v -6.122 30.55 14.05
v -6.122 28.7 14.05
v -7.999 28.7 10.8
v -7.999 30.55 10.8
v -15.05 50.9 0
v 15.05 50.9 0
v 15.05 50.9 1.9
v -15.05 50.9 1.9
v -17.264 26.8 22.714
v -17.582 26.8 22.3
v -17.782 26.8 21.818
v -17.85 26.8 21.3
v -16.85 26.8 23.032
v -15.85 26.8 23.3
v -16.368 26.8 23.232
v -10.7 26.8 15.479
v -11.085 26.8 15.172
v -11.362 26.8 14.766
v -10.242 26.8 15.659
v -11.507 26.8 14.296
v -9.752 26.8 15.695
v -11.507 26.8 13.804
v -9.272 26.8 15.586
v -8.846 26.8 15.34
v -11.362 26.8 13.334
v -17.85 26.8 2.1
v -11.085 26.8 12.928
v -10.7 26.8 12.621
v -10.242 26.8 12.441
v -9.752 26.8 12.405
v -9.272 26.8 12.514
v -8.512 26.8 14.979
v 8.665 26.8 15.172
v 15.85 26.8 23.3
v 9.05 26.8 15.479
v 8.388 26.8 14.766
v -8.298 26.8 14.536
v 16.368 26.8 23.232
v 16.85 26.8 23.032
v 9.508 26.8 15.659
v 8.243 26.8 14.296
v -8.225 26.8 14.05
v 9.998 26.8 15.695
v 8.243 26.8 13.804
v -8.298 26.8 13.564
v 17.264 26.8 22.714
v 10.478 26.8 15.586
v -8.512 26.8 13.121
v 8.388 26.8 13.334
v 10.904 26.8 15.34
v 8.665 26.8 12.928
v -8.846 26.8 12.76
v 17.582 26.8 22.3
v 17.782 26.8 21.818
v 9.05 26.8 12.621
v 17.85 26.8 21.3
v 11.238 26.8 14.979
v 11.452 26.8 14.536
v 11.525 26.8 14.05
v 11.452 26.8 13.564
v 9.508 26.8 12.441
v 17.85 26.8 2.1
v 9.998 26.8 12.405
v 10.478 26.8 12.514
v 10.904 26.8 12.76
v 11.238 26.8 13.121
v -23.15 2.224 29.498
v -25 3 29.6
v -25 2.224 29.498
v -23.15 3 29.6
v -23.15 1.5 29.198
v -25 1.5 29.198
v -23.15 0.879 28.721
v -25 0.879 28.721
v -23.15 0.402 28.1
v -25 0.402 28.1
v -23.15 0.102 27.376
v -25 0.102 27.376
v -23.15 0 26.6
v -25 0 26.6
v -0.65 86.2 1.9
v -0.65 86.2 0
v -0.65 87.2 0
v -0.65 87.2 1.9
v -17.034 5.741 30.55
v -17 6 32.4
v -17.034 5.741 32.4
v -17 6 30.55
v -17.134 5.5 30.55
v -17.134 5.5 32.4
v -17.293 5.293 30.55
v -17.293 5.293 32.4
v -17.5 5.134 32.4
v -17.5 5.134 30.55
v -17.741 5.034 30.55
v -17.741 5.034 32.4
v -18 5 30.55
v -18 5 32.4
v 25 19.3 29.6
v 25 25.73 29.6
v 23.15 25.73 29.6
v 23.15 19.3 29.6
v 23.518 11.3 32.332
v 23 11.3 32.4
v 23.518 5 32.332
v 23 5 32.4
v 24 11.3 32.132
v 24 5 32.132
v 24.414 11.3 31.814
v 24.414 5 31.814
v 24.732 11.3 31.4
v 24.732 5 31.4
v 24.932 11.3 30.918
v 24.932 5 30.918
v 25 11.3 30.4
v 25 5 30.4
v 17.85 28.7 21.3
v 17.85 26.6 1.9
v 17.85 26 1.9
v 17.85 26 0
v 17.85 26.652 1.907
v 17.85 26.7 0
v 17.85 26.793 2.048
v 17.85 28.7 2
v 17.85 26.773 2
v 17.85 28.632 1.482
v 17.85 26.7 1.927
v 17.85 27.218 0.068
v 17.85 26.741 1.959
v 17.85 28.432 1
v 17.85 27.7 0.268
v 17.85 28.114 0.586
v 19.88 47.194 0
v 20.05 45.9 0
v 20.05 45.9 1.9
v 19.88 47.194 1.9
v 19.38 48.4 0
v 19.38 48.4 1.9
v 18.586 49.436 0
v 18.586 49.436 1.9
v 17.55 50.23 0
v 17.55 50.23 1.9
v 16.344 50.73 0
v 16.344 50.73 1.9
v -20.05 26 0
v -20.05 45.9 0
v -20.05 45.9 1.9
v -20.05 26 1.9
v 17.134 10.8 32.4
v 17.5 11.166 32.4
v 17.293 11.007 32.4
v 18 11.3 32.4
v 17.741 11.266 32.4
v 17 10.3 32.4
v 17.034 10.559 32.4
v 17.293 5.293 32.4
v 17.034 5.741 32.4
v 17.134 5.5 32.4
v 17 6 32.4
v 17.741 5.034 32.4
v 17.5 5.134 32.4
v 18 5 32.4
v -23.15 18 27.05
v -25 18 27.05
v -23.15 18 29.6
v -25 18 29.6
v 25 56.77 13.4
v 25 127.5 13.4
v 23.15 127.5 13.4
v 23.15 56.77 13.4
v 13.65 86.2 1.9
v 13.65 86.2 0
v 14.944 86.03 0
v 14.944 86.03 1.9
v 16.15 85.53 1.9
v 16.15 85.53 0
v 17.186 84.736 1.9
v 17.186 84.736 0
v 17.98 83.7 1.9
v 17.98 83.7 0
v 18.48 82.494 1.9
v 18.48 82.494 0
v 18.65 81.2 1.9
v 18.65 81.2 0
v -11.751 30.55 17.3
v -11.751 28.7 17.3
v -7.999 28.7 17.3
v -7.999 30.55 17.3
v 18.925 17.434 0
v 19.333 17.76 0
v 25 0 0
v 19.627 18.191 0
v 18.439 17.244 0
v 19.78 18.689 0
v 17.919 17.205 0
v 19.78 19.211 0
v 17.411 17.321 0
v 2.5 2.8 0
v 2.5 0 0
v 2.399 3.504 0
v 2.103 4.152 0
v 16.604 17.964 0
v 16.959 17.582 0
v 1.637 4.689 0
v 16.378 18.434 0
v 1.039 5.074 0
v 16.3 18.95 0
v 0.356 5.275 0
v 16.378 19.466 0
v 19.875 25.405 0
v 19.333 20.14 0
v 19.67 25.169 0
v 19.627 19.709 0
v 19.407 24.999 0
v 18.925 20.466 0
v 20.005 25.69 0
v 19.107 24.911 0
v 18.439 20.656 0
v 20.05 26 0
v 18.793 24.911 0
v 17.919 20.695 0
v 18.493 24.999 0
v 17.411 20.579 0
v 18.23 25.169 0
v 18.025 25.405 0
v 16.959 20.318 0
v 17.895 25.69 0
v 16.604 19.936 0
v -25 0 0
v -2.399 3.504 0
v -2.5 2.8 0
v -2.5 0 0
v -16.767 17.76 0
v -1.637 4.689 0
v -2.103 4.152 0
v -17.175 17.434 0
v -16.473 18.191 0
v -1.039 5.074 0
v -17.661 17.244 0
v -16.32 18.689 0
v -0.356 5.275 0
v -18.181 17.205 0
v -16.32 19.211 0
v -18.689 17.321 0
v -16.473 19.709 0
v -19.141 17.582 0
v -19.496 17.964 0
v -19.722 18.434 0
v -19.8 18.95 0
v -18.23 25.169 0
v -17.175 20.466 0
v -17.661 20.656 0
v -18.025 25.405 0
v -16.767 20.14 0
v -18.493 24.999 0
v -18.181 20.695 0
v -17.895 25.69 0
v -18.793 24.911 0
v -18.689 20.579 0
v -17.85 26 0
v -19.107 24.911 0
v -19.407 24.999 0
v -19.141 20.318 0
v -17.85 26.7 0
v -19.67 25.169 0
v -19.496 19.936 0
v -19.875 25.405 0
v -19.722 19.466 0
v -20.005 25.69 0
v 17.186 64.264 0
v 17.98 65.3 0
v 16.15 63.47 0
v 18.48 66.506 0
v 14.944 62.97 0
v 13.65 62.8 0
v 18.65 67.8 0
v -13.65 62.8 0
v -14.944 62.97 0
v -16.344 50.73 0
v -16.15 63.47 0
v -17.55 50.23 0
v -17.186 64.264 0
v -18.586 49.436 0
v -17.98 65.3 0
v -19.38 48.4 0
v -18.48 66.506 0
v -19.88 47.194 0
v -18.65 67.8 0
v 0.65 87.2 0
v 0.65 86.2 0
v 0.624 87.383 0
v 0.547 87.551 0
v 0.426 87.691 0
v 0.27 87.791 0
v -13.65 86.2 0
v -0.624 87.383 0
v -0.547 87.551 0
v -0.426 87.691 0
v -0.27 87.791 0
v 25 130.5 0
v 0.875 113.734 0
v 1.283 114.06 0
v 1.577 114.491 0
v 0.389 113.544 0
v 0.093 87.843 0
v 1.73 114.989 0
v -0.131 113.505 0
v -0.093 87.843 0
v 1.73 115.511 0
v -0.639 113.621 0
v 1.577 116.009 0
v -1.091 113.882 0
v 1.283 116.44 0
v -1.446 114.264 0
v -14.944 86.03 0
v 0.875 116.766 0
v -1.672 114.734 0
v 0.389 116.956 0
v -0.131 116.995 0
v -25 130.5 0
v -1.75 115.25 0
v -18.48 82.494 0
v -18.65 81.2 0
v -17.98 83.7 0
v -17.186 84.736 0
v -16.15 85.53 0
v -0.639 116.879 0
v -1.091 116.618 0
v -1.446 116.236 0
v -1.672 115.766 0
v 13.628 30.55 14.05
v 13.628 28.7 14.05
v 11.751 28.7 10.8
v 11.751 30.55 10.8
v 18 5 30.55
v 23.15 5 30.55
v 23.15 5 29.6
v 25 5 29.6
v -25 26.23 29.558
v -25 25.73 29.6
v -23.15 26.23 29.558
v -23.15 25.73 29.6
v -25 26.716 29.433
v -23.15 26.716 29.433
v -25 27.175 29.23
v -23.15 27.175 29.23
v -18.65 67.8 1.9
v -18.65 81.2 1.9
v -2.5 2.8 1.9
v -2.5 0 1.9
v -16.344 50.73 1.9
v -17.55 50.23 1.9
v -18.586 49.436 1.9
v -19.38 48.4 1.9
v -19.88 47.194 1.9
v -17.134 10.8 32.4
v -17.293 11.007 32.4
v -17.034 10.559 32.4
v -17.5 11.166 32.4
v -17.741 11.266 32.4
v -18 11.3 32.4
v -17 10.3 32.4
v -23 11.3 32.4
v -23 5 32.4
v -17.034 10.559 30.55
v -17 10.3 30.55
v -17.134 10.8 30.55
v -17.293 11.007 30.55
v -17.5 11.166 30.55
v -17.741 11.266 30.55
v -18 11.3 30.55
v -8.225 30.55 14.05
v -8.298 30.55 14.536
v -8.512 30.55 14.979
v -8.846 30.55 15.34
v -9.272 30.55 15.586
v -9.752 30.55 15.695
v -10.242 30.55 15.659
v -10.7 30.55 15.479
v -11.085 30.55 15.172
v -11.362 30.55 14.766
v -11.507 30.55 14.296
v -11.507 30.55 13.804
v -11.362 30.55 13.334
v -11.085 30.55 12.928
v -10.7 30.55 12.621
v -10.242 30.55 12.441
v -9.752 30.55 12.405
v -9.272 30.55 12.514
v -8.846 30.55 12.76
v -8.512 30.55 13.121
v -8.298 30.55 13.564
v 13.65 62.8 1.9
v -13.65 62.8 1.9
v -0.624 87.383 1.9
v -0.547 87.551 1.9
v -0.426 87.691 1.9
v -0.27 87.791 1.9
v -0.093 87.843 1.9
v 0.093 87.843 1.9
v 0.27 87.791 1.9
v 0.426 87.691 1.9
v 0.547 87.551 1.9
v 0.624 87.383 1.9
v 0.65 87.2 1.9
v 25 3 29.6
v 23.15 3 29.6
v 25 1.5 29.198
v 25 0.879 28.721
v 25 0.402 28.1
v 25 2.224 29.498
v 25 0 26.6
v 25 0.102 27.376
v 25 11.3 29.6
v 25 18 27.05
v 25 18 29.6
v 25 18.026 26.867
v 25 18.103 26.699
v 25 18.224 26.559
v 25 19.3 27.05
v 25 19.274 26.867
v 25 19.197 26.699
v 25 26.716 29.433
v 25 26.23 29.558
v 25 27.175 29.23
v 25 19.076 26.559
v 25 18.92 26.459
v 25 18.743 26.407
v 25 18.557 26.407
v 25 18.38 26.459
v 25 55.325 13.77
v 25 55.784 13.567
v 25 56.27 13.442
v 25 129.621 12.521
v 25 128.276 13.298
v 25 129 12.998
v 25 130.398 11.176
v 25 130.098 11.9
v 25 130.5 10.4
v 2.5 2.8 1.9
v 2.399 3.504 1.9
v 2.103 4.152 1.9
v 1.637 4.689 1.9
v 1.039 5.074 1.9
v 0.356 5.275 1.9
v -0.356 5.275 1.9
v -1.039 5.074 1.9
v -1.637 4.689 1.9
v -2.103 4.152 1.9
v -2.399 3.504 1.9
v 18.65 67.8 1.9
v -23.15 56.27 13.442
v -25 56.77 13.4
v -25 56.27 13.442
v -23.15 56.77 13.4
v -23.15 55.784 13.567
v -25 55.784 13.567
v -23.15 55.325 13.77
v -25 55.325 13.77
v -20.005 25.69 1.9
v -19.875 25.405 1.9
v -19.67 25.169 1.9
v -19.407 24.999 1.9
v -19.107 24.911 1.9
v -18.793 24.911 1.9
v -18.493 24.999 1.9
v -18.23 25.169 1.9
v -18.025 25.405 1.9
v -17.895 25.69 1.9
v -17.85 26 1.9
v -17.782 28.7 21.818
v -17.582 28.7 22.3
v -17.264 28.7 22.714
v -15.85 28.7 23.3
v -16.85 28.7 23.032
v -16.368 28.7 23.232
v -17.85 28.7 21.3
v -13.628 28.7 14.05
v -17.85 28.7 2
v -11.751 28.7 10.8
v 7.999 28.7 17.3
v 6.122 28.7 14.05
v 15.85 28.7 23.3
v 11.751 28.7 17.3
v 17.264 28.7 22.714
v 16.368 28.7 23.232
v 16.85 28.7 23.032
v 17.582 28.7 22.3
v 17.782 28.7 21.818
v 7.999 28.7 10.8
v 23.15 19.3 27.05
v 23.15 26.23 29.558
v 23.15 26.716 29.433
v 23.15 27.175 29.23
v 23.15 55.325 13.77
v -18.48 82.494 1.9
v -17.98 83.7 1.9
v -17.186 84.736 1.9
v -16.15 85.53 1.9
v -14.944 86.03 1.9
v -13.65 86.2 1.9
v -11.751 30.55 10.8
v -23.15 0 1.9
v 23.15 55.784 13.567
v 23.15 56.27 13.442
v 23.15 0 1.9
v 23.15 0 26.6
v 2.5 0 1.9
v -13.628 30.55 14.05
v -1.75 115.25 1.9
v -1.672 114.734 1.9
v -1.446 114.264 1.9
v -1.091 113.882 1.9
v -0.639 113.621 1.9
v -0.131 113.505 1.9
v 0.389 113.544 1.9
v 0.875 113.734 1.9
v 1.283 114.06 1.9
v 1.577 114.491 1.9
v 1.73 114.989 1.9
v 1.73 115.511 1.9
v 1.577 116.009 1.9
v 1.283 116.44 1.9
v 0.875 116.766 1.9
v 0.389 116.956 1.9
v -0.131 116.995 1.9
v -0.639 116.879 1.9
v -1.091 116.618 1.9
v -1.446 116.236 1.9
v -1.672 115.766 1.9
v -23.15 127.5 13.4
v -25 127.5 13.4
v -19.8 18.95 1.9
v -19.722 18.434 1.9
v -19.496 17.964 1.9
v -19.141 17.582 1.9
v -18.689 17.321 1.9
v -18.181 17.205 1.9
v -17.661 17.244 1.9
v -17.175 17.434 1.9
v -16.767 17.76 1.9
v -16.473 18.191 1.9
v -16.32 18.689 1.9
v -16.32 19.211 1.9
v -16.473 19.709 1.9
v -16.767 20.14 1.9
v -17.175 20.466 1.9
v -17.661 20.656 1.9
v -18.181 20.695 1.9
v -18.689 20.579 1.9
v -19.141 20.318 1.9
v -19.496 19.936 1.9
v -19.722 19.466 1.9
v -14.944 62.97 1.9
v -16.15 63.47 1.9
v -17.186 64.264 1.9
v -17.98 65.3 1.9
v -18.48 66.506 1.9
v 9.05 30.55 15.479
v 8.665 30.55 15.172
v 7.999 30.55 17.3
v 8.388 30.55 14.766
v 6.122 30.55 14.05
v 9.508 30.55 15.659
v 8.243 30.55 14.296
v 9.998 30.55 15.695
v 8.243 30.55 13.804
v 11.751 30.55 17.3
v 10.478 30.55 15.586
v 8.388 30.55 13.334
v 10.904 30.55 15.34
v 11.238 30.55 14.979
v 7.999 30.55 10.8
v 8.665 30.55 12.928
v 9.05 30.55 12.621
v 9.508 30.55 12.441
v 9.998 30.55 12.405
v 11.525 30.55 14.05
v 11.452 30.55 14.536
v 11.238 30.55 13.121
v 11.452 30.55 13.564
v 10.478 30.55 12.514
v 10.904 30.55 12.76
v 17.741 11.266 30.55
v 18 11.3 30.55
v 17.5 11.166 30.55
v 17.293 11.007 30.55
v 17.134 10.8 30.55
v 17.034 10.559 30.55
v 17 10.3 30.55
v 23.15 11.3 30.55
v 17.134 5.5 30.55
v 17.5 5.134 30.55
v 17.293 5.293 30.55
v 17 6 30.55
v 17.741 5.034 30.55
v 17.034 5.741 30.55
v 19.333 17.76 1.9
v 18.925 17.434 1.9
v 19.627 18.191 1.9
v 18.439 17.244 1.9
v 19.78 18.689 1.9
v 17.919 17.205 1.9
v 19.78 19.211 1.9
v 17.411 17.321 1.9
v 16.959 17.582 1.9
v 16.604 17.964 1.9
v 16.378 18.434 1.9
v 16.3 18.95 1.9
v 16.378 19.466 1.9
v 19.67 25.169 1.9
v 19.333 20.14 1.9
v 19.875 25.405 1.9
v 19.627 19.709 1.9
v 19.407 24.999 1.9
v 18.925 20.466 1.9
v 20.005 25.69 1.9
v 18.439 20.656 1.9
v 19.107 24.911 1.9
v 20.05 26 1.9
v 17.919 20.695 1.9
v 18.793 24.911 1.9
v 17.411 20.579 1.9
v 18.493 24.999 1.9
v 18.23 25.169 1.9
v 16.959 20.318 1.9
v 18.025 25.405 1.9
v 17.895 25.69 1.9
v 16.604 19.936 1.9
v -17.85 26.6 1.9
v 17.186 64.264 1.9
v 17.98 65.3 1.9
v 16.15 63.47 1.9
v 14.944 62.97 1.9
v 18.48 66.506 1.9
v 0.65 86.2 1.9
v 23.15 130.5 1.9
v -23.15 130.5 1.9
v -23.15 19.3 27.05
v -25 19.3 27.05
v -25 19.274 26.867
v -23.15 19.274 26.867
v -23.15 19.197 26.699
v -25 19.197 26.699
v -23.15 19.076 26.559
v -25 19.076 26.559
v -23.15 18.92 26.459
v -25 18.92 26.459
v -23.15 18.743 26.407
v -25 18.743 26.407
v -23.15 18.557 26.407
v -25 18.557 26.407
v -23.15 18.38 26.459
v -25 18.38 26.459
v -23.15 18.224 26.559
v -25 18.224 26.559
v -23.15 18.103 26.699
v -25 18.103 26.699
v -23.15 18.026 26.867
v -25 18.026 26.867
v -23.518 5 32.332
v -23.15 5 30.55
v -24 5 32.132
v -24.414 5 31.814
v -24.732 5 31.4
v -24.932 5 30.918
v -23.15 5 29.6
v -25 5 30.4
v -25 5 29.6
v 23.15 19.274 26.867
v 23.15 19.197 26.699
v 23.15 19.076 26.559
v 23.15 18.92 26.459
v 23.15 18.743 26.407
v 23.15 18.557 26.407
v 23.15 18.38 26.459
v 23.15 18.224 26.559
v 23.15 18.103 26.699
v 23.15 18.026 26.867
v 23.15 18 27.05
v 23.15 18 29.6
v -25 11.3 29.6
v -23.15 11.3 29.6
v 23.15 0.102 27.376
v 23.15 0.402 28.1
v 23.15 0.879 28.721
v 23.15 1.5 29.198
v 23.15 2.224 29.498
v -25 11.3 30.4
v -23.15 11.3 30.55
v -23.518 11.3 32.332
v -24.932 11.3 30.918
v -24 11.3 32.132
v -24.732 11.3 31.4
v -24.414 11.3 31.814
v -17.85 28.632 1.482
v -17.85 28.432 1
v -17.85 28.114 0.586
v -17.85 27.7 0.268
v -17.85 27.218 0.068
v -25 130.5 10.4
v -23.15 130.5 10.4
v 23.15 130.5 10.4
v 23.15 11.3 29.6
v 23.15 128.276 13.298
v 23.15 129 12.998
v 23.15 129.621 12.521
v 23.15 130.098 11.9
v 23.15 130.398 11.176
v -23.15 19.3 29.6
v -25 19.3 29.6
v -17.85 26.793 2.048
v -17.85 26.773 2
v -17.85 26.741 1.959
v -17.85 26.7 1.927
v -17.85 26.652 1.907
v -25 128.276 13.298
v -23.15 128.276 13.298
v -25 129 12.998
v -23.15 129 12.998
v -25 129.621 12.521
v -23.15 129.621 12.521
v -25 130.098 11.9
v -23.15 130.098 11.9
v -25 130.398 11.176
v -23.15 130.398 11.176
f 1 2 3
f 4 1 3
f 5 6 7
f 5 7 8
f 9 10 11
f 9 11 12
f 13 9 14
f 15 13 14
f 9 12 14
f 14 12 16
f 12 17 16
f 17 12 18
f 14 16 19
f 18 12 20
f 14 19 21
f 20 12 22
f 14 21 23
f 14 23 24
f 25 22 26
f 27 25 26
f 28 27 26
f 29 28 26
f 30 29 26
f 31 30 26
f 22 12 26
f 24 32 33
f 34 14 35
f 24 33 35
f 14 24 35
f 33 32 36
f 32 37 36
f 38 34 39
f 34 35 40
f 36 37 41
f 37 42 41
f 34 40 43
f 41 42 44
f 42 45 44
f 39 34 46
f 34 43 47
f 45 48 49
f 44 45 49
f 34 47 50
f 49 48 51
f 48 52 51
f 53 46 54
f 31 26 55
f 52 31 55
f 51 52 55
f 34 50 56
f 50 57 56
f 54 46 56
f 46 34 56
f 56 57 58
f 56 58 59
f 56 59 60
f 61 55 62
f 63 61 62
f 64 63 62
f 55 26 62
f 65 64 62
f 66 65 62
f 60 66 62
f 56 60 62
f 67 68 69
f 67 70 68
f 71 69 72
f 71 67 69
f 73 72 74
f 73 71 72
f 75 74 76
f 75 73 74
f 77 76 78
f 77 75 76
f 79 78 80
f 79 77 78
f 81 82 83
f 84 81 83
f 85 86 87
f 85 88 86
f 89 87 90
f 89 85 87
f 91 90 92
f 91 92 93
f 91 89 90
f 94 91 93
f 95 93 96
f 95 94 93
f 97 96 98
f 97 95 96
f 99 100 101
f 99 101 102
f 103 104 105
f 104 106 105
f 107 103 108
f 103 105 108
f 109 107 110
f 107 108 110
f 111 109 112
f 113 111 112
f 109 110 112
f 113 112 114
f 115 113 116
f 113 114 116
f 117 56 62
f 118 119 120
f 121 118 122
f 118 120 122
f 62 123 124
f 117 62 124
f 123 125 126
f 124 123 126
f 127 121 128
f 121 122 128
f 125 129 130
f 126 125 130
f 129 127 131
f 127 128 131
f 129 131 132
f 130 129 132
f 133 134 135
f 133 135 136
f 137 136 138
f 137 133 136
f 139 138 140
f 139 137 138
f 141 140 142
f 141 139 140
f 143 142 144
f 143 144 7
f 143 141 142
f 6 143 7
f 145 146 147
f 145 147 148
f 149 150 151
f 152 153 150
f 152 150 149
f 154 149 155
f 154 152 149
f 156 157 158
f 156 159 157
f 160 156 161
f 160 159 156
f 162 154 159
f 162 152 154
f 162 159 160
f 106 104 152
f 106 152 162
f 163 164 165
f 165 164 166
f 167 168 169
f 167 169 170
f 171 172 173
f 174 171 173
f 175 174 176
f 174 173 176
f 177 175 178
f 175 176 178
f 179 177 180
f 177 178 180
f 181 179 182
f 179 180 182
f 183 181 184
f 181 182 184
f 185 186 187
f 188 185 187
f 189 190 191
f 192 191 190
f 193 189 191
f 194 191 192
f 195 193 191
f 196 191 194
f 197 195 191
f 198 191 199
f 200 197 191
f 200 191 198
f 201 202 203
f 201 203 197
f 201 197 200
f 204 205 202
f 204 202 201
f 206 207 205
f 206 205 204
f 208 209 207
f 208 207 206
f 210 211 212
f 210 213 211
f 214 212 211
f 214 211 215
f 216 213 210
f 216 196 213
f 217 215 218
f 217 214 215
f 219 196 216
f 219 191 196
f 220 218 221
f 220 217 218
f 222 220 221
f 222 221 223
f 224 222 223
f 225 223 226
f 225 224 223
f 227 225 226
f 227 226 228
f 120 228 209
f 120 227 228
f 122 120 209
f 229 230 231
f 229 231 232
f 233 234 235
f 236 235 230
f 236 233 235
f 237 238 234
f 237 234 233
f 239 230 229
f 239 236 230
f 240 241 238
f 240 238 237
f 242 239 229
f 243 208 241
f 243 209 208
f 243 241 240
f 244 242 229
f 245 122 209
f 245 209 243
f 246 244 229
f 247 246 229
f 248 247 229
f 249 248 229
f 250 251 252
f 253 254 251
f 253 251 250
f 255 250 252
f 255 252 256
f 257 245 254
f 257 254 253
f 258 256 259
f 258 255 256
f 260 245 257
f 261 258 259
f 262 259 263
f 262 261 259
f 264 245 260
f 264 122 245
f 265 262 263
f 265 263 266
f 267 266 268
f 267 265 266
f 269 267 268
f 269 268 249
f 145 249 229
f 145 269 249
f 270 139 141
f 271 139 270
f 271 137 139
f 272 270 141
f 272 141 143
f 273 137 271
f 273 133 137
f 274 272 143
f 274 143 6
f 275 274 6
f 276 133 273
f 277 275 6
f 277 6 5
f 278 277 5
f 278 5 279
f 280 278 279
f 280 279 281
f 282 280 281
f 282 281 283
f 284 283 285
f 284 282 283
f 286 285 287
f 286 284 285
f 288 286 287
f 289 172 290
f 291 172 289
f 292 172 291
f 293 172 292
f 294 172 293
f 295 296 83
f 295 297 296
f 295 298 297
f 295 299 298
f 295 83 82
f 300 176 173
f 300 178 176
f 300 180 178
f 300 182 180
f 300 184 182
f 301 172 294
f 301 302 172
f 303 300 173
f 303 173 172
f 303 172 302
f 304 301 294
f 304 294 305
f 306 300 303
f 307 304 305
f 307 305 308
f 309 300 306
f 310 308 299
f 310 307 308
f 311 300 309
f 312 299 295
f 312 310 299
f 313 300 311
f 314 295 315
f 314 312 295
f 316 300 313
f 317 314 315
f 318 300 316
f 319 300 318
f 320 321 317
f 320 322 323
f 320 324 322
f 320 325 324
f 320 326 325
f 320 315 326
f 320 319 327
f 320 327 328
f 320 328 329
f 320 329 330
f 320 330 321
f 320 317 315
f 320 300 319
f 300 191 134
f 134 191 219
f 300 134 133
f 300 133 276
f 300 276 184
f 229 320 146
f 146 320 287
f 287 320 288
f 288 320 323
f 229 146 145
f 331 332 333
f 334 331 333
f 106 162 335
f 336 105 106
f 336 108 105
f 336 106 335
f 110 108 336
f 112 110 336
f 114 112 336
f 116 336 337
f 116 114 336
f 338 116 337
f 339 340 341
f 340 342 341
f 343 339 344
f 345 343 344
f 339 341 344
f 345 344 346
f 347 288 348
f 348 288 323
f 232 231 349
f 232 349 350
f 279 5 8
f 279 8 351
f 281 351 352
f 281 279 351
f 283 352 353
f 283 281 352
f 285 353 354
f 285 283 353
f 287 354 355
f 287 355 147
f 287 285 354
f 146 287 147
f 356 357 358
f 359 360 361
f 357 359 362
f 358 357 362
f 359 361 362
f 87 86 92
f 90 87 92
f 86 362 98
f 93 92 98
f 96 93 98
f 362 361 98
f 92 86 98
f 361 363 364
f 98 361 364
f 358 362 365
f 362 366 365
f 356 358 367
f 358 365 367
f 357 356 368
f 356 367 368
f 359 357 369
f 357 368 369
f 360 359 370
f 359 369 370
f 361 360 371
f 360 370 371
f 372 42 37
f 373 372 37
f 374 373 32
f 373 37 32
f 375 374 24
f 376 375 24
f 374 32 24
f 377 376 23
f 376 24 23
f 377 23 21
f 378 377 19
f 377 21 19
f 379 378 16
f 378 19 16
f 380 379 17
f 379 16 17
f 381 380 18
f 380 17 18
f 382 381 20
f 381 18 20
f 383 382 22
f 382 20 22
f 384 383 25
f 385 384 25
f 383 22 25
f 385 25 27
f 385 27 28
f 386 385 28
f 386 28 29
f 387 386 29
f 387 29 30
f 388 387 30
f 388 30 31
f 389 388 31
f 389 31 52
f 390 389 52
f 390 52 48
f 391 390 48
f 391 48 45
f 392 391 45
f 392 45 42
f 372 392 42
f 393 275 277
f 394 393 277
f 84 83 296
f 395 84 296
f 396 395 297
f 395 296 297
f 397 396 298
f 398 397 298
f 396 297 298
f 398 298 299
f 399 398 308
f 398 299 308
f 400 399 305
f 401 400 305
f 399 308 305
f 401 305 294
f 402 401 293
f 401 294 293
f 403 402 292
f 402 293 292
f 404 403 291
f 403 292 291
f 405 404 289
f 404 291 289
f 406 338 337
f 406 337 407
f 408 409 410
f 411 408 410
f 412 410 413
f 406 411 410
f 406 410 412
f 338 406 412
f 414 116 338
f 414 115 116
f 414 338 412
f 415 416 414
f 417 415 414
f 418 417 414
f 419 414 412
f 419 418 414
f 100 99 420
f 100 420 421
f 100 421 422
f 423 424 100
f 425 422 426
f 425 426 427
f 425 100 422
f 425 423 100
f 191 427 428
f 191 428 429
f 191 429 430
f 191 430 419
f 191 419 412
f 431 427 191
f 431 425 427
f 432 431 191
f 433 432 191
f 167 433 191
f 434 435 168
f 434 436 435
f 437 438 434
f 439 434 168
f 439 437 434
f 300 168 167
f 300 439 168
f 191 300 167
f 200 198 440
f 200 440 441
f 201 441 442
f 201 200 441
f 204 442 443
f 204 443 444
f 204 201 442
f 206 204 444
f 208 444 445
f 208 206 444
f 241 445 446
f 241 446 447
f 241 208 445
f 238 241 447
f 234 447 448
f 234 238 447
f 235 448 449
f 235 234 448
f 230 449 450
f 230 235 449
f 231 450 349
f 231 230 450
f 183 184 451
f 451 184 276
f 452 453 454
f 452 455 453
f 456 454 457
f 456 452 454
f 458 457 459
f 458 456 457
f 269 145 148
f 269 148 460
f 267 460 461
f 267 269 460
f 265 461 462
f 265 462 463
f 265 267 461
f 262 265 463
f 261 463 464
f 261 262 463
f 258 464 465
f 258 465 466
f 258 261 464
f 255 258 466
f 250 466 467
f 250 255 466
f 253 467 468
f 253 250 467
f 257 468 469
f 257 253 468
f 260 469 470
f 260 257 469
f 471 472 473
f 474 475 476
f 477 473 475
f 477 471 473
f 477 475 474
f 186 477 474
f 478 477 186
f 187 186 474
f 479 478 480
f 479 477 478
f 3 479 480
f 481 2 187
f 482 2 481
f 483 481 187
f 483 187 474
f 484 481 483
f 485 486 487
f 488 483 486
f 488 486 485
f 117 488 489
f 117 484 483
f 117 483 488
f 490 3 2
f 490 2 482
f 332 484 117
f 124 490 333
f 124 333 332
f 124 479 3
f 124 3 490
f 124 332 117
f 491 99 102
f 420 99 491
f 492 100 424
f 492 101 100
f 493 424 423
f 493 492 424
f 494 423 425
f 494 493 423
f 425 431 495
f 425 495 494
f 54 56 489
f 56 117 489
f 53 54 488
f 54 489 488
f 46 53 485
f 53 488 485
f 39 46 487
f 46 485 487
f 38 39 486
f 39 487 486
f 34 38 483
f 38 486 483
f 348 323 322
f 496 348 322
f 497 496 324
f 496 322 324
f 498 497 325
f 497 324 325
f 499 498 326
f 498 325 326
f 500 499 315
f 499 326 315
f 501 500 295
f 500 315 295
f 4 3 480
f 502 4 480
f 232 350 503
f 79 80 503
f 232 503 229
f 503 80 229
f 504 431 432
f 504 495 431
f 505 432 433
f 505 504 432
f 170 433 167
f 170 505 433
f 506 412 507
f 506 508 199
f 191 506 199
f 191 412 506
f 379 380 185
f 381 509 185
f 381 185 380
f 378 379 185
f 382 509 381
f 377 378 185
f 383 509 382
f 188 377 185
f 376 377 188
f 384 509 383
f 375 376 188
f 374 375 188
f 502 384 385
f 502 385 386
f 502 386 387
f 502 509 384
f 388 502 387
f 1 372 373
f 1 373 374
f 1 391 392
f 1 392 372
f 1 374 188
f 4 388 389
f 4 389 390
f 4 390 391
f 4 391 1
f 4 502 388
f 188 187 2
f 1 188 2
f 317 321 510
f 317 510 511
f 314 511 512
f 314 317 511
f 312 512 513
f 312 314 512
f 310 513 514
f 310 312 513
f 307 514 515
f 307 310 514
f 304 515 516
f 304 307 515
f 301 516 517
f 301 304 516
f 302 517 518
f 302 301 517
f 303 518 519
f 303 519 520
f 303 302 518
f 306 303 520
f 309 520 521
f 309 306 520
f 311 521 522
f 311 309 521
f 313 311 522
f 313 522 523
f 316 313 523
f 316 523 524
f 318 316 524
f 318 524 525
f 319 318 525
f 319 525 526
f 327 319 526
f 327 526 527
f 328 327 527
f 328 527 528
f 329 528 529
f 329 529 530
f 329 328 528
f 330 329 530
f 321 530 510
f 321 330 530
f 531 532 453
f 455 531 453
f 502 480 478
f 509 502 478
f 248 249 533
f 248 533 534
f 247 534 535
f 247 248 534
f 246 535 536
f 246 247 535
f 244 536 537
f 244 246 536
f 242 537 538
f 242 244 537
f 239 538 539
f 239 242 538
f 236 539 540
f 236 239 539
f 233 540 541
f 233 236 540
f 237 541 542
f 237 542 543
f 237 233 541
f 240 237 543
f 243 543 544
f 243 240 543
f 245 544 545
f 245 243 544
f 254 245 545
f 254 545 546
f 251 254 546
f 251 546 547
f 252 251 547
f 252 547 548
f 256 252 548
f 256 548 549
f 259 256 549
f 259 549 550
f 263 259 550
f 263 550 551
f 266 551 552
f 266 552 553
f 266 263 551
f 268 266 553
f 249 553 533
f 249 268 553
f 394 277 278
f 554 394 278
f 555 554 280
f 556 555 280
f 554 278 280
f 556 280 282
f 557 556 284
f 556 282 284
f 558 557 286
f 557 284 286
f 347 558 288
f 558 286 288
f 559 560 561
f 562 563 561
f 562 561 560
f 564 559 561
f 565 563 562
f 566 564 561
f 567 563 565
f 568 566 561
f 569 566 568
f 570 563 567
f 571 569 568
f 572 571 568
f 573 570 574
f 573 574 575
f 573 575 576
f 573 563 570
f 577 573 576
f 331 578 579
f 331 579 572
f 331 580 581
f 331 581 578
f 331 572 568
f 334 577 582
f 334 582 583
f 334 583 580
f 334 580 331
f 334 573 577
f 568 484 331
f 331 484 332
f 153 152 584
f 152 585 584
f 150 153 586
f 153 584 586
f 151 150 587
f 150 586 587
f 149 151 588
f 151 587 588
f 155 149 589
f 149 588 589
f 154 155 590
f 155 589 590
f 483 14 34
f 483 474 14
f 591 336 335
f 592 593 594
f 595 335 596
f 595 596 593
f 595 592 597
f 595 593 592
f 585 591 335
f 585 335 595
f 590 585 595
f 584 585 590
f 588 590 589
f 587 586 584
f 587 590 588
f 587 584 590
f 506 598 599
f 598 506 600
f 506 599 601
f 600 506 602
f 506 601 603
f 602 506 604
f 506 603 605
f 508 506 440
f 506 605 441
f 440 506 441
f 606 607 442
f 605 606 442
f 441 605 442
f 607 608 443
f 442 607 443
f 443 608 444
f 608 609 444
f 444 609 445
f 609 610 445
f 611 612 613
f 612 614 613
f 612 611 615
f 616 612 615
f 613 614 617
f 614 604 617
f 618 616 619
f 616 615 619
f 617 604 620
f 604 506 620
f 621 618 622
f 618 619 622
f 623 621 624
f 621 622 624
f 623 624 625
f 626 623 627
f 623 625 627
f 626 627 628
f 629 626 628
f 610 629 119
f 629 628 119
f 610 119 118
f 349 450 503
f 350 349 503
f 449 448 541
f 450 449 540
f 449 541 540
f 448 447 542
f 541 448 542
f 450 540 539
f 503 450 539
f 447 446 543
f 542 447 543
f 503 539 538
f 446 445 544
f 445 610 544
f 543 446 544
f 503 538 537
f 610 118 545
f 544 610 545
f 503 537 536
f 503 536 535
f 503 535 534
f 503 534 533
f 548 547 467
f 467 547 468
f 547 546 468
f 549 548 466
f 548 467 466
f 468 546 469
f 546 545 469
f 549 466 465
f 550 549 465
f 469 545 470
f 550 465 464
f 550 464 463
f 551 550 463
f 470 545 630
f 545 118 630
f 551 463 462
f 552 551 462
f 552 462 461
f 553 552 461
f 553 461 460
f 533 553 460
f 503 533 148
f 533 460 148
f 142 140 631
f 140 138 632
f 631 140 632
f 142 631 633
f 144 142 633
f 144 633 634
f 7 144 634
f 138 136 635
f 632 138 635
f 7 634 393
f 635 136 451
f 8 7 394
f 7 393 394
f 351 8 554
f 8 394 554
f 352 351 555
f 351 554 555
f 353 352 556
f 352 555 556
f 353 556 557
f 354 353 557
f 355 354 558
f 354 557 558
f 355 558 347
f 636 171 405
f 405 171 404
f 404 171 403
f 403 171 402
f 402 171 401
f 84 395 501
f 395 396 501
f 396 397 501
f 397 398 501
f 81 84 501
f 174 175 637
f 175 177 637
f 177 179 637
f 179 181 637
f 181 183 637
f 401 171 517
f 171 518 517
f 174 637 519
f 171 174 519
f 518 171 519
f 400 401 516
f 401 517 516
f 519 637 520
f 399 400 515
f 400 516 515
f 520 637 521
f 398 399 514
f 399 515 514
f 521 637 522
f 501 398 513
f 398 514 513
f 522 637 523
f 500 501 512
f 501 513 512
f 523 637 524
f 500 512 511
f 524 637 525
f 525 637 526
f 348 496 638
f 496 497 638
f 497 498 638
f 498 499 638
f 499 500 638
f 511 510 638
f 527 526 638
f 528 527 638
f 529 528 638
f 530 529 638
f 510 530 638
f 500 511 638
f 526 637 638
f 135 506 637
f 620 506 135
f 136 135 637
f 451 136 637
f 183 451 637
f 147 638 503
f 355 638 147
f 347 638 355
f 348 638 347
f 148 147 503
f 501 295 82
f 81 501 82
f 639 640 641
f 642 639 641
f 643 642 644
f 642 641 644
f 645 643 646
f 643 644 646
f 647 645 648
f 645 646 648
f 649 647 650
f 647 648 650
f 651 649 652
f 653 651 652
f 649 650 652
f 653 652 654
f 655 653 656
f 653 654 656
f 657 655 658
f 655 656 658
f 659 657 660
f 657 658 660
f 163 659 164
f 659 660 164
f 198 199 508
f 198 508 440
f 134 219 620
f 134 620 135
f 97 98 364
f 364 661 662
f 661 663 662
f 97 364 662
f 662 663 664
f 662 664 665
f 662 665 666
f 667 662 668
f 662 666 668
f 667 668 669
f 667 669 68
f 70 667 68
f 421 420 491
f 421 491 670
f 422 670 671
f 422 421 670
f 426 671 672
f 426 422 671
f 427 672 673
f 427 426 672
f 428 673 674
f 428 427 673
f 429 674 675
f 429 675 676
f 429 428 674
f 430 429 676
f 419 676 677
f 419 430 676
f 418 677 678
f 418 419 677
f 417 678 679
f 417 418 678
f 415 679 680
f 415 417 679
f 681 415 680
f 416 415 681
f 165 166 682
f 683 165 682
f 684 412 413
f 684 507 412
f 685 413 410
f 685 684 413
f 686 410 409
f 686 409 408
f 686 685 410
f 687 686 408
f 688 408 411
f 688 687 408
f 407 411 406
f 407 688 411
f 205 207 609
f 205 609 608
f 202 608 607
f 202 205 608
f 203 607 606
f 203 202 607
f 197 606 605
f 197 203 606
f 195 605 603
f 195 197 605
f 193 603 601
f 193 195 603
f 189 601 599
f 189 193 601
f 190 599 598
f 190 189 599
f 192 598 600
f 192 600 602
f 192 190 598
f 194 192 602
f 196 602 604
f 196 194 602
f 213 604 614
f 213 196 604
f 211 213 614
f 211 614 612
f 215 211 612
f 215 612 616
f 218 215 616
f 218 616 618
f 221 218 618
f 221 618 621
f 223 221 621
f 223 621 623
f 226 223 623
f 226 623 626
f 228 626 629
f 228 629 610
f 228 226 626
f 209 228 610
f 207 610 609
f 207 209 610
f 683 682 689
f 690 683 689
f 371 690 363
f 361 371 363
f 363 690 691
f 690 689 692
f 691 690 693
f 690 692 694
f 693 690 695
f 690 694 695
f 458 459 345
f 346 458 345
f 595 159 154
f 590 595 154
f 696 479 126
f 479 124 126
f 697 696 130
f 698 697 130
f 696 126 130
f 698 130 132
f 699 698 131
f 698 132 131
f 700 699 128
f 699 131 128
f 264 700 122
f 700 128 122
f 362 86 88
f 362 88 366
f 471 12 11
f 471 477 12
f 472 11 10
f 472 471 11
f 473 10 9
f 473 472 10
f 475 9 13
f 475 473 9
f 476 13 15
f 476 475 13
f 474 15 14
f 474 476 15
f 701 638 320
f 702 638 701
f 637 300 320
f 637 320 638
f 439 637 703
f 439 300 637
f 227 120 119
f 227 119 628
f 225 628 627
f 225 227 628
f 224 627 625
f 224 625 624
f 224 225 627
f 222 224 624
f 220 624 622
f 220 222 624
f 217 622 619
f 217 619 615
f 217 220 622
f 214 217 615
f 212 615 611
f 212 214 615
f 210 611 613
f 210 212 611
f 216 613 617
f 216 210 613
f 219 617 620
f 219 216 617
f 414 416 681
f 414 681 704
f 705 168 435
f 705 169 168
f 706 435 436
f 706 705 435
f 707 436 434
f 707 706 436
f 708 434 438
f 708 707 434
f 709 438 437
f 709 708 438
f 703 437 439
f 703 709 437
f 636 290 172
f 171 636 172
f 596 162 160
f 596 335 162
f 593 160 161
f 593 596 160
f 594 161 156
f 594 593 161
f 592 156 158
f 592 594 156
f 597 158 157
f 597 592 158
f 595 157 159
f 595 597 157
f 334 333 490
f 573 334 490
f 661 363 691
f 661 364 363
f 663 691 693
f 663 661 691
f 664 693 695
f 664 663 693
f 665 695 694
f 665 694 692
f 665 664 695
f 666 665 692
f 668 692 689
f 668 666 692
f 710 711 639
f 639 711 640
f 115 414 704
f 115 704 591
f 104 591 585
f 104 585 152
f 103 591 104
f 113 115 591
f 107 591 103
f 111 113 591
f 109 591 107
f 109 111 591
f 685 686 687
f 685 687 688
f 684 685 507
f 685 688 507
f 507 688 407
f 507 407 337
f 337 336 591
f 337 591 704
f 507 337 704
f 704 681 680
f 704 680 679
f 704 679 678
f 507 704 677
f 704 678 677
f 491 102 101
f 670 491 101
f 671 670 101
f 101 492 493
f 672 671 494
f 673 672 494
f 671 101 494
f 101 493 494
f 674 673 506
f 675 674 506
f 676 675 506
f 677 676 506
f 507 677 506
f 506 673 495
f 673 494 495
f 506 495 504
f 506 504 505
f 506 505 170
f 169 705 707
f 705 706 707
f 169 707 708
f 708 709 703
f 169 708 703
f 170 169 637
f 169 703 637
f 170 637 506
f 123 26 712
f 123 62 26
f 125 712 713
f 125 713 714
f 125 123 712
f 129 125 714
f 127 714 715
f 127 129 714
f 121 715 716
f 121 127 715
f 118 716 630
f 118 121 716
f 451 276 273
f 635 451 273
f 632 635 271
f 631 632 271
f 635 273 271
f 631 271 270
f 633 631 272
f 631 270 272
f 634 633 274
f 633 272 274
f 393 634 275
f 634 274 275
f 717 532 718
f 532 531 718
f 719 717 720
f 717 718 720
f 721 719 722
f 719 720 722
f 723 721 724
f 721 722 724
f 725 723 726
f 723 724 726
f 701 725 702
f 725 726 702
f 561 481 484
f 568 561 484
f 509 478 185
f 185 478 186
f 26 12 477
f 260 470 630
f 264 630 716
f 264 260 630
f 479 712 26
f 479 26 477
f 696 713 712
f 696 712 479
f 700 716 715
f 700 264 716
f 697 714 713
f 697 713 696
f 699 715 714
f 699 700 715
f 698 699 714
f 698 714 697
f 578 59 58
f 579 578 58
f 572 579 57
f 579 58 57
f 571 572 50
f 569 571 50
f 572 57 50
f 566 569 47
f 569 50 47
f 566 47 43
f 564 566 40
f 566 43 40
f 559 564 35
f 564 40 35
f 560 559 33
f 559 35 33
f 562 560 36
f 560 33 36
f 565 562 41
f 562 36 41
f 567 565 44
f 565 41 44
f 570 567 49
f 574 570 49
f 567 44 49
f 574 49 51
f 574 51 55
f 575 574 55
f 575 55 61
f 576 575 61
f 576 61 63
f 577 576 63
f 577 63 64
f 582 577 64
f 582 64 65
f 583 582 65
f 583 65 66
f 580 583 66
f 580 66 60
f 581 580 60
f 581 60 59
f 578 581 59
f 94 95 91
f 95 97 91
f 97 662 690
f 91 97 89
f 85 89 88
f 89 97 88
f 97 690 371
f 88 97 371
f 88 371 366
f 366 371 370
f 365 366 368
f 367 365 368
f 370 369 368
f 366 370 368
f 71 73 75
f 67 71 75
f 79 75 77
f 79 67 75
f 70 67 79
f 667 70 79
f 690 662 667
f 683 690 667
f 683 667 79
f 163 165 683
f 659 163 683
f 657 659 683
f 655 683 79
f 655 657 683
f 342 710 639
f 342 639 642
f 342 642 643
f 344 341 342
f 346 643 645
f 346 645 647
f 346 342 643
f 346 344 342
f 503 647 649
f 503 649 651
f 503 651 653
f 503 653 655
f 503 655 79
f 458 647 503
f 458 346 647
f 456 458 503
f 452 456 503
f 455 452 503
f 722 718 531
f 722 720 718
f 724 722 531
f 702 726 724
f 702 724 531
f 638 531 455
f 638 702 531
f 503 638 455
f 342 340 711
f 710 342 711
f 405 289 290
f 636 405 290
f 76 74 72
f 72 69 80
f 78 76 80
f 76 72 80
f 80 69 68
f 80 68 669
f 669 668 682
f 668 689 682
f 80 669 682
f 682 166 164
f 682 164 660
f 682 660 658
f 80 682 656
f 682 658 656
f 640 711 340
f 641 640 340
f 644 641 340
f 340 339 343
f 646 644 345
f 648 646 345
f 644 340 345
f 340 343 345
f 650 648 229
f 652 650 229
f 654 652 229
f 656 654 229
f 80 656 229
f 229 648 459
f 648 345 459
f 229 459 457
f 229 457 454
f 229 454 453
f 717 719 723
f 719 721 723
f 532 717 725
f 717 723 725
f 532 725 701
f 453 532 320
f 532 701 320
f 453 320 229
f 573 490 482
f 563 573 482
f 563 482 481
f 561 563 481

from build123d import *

# Parameters (mm, degrees)
ESQUISSE1_R           = 1.75
BOSS_EXTRU_1_DEPTH    = 1.9
ESQUISSE2_W           = 35.7
ESQUISSE2_H           = 1.9
BOSS_EXTRU_2_DEPTH    = 21.4
CONG_1_R              = 2
CONG_2_R              = 0.2
CONG_3_R              = 2
BOSS_EXTRU_3_DEPTH    = 1.85
TROU_TARAUD_M41_D     = 3.3
BOSS_EXTRU_4_DEPTH    = 1.85
CONG_4_R              = 3
ESQUISSE7_W           = 8
ESQUISSE7_H           = 6.3
BOSS_EXTRU_5_DEPTH    = 1.85
CONG_5_R              = 1
CONG_6_R              = 2
CONG_4_OF_SYM_TRIE1_R = 3
CONG_5_OF_SYM_TRIE1_R = 1
CONG_6_OF_SYM_TRIE1_R = 2


with BuildPart() as part:
    # Esquisse1 → Boss.-Extru.1 (new body)
    with BuildSketch(Plane.XY):
        with BuildLine():
            Line((25, 0), (2.5, 0))
            Line((2.5, 0), (2.5, 2.8))
            ThreePointArc((2.5, 2.8), (0, 5.3), (-2.5, 2.8))
            Line((-2.5, 2.8), (-2.5, 0))
            Line((-2.5, 0), (-25, 0))
            Line((-25, 0), (-25, 130.5))
            Line((-25, 130.5), (25, 130.5))
            Line((25, 130.5), (25, 0))
        make_face()
        with Locations(Location((-18.05, 18.95, 0), (0, 0, 180))):
            Circle(ESQUISSE1_R, mode=Mode.SUBTRACT)
        with Locations(Location((18.05, 18.95, 0), (0, 0, 180))):
            Circle(ESQUISSE1_R, mode=Mode.SUBTRACT)
        with Locations(Location((0, 115.25, 0), (0, 0, 180))):
            Circle(ESQUISSE1_R, mode=Mode.SUBTRACT)
        with BuildLine():
            Line((-17.85, 26), (-17.85, 28.7))
            Line((-17.85, 28.7), (17.85, 28.7))
            Line((17.85, 28.7), (17.85, 26))
            ThreePointArc((17.85, 26), (18.95, 24.9), (20.05, 26))
            Line((20.05, 26), (20.05, 45.9))
            ThreePointArc((20.05, 45.9), (18.585533906, 49.435533906), (15.05, 50.9))
            Line((15.05, 50.9), (-15.05, 50.9))
            ThreePointArc((-15.05, 50.9), (-18.585533906, 49.435533906), (-20.05, 45.9))
            Line((-20.05, 45.9), (-20.05, 26))
            ThreePointArc((-20.05, 26), (-18.95, 24.9), (-17.85, 26))
        make_face(mode=Mode.SUBTRACT)
        with BuildLine():
            Line((-13.65, 86.2), (-0.65, 86.2))
            Line((-0.65, 86.2), (-0.65, 87.2))
            ThreePointArc((-0.65, 87.2), (0, 87.85), (0.65, 87.2))
            Line((0.65, 87.2), (0.65, 86.2))
            Line((0.65, 86.2), (13.65, 86.2))
            ThreePointArc((13.65, 86.2), (17.185533906, 84.735533906), (18.65, 81.2))
            Line((18.65, 81.2), (18.65, 67.8))
            ThreePointArc((18.65, 67.8), (17.185533906, 64.264466094), (13.65, 62.8))
            Line((13.65, 62.8), (-13.65, 62.8))
            ThreePointArc((-13.65, 62.8), (-17.185533906, 64.264466094), (-18.65, 67.8))
            Line((-18.65, 67.8), (-18.65, 81.2))
            ThreePointArc((-18.65, 81.2), (-17.185533906, 84.735533906), (-13.65, 86.2))
        make_face(mode=Mode.SUBTRACT)
    extrude(amount=BOSS_EXTRU_1_DEPTH)

    # Esquisse2 → Boss.-Extru.2 (add)
    with BuildSketch(Plane.XY.offset(1.9)):
        with Locations((0, 27.75)):
            Rectangle(ESQUISSE2_W, ESQUISSE2_H)
    extrude(amount=BOSS_EXTRU_2_DEPTH)

    # Congé1
    cong_1_edges = [part.edges().sort_by_distance(p)[0] for p in [
        (-17.85, 27.75, 23.3),
        (17.85, 27.75, 23.3),
    ]]
    fillet(cong_1_edges, radius=CONG_1_R)

    # Congé2
    cong_2_edges = [part.edges().sort_by_distance(p)[0] for p in [
        (0, 26.8, 1.9),
    ]]
    fillet(cong_2_edges, radius=CONG_2_R)

    # Congé3
    cong_3_edges = [part.edges().sort_by_distance(p)[0] for p in [
        (0, 28.7, 0),
    ]]
    fillet(cong_3_edges, radius=CONG_3_R)

    # Esquisse3 → Boss.-Extru.3 (add)
    with BuildSketch(Plane(origin=(0, 28.7, 0), x_dir=(1, 0, 0), z_dir=(0, 1, 0))):
        Polygon((6.12222325, -14.05), (7.998611625, -17.3), (11.751388375, -17.3), (13.62777675, -14.05), (11.751388375, -10.8), (7.998611625, -10.8), align=None)
        Polygon((-6.12222325, -14.05), (-7.998611625, -10.8), (-11.751388375, -10.8), (-13.62777675, -14.05), (-11.751388375, -17.3), (-7.998611625, -17.3), align=None)
    extrude(amount=BOSS_EXTRU_3_DEPTH)

    # Trou taraudé M41 (through all)
    with Locations(Plane(origin=(0, 30.55, 0), x_dir=(-1, 0, 0), z_dir=(0, 1, 0))):
        with Locations((-9.875, 14.05), (9.875, 14.05)):
            Hole(TROU_TARAUD_M41_D / 2)

    # Esquisse6 → Boss.-Extru.4 (add)
    with BuildSketch(Plane.ZY.offset(25)):
        with BuildLine():
            Line((13.4, 130.5), (13.4, 56))
            Line((13.4, 56), (29.6, 26.5))
            Line((29.6, 26.5), (29.6, 19.3))
            Line((29.6, 19.3), (27.05, 19.3))
            ThreePointArc((27.05, 19.3), (26.4, 18.65), (27.05, 18))
            Line((27.05, 18), (29.6, 18))
            Line((29.6, 18), (29.6, 11.3))
            Line((29.6, 11.3), (32.4, 11.3))
            Line((32.4, 11.3), (32.4, 5))
            Line((32.4, 5), (29.6, 5))
            Line((29.6, 5), (29.6, 0))
            Line((29.6, 0), (0, 0))
            Line((0, 0), (0, 130.5))
            Line((0, 130.5), (13.4, 130.5))
        make_face()
    boss_extru_4 = extrude(amount=-BOSS_EXTRU_4_DEPTH)

    # Congé4
    cong_4_edges = [part.edges().sort_by_distance(p)[0] for p in [
        (-24.075, 130.5, 13.4),
        (-24.075, 56, 13.4),
        (-24.075, 26.5, 29.6),
        (-24.075, 0, 29.6),
    ]]
    fillet(cong_4_edges, radius=CONG_4_R)

    # Esquisse7 → Boss.-Extru.5 (add)
    with BuildSketch(Plane.XY.offset(32.4)):
        with Locations((-21, 8.15)):
            Rectangle(ESQUISSE7_W, ESQUISSE7_H)
    boss_extru_5 = extrude(amount=-BOSS_EXTRU_5_DEPTH)

    # Congé5
    cong_5_edges = [part.edges().sort_by_distance(p)[0] for p in [
        (-17, 5, 31.475),
        (-17, 11.3, 31.475),
    ]]
    fillet(cong_5_edges, radius=CONG_5_R)

    # Congé6
    cong_6_edges = [part.edges().sort_by_distance(p)[0] for p in [
        (-25, 8.15, 32.4),
    ]]
    fillet(cong_6_edges, radius=CONG_6_R)

    # Symétrie1: Boss.-Extru.4, Boss.-Extru.5 across plane
    add(boss_extru_4.mirror(Plane(origin=(0, 0, 0), x_dir=(0, 0, 1), z_dir=(1, 0, 0))))
    add(boss_extru_5.mirror(Plane(origin=(0, 0, 0), x_dir=(0, 0, 1), z_dir=(1, 0, 0))))

    # Congé4 of Symétrie1
    cong_4_of_sym_trie1_edges = [part.edges().sort_by_distance(p)[0] for p in [
        (24.075, 130.5, 13.4),
        (24.075, 56, 13.4),
        (24.075, 26.5, 29.6),
        (24.075, 0, 29.6),
    ]]
    fillet(cong_4_of_sym_trie1_edges, radius=CONG_4_OF_SYM_TRIE1_R)

    # Congé5 of Symétrie1
    cong_5_of_sym_trie1_edges = [part.edges().sort_by_distance(p)[0] for p in [
        (17, 5, 31.475),
        (17, 11.3, 31.475),
    ]]
    fillet(cong_5_of_sym_trie1_edges, radius=CONG_5_OF_SYM_TRIE1_R)

    # Congé6 of Symétrie1
    cong_6_of_sym_trie1_edges = [part.edges().sort_by_distance(p)[0] for p in [
        (25, 8.15, 32.4),
    ]]
    fillet(cong_6_of_sym_trie1_edges, radius=CONG_6_OF_SYM_TRIE1_R)


solid = part.part
